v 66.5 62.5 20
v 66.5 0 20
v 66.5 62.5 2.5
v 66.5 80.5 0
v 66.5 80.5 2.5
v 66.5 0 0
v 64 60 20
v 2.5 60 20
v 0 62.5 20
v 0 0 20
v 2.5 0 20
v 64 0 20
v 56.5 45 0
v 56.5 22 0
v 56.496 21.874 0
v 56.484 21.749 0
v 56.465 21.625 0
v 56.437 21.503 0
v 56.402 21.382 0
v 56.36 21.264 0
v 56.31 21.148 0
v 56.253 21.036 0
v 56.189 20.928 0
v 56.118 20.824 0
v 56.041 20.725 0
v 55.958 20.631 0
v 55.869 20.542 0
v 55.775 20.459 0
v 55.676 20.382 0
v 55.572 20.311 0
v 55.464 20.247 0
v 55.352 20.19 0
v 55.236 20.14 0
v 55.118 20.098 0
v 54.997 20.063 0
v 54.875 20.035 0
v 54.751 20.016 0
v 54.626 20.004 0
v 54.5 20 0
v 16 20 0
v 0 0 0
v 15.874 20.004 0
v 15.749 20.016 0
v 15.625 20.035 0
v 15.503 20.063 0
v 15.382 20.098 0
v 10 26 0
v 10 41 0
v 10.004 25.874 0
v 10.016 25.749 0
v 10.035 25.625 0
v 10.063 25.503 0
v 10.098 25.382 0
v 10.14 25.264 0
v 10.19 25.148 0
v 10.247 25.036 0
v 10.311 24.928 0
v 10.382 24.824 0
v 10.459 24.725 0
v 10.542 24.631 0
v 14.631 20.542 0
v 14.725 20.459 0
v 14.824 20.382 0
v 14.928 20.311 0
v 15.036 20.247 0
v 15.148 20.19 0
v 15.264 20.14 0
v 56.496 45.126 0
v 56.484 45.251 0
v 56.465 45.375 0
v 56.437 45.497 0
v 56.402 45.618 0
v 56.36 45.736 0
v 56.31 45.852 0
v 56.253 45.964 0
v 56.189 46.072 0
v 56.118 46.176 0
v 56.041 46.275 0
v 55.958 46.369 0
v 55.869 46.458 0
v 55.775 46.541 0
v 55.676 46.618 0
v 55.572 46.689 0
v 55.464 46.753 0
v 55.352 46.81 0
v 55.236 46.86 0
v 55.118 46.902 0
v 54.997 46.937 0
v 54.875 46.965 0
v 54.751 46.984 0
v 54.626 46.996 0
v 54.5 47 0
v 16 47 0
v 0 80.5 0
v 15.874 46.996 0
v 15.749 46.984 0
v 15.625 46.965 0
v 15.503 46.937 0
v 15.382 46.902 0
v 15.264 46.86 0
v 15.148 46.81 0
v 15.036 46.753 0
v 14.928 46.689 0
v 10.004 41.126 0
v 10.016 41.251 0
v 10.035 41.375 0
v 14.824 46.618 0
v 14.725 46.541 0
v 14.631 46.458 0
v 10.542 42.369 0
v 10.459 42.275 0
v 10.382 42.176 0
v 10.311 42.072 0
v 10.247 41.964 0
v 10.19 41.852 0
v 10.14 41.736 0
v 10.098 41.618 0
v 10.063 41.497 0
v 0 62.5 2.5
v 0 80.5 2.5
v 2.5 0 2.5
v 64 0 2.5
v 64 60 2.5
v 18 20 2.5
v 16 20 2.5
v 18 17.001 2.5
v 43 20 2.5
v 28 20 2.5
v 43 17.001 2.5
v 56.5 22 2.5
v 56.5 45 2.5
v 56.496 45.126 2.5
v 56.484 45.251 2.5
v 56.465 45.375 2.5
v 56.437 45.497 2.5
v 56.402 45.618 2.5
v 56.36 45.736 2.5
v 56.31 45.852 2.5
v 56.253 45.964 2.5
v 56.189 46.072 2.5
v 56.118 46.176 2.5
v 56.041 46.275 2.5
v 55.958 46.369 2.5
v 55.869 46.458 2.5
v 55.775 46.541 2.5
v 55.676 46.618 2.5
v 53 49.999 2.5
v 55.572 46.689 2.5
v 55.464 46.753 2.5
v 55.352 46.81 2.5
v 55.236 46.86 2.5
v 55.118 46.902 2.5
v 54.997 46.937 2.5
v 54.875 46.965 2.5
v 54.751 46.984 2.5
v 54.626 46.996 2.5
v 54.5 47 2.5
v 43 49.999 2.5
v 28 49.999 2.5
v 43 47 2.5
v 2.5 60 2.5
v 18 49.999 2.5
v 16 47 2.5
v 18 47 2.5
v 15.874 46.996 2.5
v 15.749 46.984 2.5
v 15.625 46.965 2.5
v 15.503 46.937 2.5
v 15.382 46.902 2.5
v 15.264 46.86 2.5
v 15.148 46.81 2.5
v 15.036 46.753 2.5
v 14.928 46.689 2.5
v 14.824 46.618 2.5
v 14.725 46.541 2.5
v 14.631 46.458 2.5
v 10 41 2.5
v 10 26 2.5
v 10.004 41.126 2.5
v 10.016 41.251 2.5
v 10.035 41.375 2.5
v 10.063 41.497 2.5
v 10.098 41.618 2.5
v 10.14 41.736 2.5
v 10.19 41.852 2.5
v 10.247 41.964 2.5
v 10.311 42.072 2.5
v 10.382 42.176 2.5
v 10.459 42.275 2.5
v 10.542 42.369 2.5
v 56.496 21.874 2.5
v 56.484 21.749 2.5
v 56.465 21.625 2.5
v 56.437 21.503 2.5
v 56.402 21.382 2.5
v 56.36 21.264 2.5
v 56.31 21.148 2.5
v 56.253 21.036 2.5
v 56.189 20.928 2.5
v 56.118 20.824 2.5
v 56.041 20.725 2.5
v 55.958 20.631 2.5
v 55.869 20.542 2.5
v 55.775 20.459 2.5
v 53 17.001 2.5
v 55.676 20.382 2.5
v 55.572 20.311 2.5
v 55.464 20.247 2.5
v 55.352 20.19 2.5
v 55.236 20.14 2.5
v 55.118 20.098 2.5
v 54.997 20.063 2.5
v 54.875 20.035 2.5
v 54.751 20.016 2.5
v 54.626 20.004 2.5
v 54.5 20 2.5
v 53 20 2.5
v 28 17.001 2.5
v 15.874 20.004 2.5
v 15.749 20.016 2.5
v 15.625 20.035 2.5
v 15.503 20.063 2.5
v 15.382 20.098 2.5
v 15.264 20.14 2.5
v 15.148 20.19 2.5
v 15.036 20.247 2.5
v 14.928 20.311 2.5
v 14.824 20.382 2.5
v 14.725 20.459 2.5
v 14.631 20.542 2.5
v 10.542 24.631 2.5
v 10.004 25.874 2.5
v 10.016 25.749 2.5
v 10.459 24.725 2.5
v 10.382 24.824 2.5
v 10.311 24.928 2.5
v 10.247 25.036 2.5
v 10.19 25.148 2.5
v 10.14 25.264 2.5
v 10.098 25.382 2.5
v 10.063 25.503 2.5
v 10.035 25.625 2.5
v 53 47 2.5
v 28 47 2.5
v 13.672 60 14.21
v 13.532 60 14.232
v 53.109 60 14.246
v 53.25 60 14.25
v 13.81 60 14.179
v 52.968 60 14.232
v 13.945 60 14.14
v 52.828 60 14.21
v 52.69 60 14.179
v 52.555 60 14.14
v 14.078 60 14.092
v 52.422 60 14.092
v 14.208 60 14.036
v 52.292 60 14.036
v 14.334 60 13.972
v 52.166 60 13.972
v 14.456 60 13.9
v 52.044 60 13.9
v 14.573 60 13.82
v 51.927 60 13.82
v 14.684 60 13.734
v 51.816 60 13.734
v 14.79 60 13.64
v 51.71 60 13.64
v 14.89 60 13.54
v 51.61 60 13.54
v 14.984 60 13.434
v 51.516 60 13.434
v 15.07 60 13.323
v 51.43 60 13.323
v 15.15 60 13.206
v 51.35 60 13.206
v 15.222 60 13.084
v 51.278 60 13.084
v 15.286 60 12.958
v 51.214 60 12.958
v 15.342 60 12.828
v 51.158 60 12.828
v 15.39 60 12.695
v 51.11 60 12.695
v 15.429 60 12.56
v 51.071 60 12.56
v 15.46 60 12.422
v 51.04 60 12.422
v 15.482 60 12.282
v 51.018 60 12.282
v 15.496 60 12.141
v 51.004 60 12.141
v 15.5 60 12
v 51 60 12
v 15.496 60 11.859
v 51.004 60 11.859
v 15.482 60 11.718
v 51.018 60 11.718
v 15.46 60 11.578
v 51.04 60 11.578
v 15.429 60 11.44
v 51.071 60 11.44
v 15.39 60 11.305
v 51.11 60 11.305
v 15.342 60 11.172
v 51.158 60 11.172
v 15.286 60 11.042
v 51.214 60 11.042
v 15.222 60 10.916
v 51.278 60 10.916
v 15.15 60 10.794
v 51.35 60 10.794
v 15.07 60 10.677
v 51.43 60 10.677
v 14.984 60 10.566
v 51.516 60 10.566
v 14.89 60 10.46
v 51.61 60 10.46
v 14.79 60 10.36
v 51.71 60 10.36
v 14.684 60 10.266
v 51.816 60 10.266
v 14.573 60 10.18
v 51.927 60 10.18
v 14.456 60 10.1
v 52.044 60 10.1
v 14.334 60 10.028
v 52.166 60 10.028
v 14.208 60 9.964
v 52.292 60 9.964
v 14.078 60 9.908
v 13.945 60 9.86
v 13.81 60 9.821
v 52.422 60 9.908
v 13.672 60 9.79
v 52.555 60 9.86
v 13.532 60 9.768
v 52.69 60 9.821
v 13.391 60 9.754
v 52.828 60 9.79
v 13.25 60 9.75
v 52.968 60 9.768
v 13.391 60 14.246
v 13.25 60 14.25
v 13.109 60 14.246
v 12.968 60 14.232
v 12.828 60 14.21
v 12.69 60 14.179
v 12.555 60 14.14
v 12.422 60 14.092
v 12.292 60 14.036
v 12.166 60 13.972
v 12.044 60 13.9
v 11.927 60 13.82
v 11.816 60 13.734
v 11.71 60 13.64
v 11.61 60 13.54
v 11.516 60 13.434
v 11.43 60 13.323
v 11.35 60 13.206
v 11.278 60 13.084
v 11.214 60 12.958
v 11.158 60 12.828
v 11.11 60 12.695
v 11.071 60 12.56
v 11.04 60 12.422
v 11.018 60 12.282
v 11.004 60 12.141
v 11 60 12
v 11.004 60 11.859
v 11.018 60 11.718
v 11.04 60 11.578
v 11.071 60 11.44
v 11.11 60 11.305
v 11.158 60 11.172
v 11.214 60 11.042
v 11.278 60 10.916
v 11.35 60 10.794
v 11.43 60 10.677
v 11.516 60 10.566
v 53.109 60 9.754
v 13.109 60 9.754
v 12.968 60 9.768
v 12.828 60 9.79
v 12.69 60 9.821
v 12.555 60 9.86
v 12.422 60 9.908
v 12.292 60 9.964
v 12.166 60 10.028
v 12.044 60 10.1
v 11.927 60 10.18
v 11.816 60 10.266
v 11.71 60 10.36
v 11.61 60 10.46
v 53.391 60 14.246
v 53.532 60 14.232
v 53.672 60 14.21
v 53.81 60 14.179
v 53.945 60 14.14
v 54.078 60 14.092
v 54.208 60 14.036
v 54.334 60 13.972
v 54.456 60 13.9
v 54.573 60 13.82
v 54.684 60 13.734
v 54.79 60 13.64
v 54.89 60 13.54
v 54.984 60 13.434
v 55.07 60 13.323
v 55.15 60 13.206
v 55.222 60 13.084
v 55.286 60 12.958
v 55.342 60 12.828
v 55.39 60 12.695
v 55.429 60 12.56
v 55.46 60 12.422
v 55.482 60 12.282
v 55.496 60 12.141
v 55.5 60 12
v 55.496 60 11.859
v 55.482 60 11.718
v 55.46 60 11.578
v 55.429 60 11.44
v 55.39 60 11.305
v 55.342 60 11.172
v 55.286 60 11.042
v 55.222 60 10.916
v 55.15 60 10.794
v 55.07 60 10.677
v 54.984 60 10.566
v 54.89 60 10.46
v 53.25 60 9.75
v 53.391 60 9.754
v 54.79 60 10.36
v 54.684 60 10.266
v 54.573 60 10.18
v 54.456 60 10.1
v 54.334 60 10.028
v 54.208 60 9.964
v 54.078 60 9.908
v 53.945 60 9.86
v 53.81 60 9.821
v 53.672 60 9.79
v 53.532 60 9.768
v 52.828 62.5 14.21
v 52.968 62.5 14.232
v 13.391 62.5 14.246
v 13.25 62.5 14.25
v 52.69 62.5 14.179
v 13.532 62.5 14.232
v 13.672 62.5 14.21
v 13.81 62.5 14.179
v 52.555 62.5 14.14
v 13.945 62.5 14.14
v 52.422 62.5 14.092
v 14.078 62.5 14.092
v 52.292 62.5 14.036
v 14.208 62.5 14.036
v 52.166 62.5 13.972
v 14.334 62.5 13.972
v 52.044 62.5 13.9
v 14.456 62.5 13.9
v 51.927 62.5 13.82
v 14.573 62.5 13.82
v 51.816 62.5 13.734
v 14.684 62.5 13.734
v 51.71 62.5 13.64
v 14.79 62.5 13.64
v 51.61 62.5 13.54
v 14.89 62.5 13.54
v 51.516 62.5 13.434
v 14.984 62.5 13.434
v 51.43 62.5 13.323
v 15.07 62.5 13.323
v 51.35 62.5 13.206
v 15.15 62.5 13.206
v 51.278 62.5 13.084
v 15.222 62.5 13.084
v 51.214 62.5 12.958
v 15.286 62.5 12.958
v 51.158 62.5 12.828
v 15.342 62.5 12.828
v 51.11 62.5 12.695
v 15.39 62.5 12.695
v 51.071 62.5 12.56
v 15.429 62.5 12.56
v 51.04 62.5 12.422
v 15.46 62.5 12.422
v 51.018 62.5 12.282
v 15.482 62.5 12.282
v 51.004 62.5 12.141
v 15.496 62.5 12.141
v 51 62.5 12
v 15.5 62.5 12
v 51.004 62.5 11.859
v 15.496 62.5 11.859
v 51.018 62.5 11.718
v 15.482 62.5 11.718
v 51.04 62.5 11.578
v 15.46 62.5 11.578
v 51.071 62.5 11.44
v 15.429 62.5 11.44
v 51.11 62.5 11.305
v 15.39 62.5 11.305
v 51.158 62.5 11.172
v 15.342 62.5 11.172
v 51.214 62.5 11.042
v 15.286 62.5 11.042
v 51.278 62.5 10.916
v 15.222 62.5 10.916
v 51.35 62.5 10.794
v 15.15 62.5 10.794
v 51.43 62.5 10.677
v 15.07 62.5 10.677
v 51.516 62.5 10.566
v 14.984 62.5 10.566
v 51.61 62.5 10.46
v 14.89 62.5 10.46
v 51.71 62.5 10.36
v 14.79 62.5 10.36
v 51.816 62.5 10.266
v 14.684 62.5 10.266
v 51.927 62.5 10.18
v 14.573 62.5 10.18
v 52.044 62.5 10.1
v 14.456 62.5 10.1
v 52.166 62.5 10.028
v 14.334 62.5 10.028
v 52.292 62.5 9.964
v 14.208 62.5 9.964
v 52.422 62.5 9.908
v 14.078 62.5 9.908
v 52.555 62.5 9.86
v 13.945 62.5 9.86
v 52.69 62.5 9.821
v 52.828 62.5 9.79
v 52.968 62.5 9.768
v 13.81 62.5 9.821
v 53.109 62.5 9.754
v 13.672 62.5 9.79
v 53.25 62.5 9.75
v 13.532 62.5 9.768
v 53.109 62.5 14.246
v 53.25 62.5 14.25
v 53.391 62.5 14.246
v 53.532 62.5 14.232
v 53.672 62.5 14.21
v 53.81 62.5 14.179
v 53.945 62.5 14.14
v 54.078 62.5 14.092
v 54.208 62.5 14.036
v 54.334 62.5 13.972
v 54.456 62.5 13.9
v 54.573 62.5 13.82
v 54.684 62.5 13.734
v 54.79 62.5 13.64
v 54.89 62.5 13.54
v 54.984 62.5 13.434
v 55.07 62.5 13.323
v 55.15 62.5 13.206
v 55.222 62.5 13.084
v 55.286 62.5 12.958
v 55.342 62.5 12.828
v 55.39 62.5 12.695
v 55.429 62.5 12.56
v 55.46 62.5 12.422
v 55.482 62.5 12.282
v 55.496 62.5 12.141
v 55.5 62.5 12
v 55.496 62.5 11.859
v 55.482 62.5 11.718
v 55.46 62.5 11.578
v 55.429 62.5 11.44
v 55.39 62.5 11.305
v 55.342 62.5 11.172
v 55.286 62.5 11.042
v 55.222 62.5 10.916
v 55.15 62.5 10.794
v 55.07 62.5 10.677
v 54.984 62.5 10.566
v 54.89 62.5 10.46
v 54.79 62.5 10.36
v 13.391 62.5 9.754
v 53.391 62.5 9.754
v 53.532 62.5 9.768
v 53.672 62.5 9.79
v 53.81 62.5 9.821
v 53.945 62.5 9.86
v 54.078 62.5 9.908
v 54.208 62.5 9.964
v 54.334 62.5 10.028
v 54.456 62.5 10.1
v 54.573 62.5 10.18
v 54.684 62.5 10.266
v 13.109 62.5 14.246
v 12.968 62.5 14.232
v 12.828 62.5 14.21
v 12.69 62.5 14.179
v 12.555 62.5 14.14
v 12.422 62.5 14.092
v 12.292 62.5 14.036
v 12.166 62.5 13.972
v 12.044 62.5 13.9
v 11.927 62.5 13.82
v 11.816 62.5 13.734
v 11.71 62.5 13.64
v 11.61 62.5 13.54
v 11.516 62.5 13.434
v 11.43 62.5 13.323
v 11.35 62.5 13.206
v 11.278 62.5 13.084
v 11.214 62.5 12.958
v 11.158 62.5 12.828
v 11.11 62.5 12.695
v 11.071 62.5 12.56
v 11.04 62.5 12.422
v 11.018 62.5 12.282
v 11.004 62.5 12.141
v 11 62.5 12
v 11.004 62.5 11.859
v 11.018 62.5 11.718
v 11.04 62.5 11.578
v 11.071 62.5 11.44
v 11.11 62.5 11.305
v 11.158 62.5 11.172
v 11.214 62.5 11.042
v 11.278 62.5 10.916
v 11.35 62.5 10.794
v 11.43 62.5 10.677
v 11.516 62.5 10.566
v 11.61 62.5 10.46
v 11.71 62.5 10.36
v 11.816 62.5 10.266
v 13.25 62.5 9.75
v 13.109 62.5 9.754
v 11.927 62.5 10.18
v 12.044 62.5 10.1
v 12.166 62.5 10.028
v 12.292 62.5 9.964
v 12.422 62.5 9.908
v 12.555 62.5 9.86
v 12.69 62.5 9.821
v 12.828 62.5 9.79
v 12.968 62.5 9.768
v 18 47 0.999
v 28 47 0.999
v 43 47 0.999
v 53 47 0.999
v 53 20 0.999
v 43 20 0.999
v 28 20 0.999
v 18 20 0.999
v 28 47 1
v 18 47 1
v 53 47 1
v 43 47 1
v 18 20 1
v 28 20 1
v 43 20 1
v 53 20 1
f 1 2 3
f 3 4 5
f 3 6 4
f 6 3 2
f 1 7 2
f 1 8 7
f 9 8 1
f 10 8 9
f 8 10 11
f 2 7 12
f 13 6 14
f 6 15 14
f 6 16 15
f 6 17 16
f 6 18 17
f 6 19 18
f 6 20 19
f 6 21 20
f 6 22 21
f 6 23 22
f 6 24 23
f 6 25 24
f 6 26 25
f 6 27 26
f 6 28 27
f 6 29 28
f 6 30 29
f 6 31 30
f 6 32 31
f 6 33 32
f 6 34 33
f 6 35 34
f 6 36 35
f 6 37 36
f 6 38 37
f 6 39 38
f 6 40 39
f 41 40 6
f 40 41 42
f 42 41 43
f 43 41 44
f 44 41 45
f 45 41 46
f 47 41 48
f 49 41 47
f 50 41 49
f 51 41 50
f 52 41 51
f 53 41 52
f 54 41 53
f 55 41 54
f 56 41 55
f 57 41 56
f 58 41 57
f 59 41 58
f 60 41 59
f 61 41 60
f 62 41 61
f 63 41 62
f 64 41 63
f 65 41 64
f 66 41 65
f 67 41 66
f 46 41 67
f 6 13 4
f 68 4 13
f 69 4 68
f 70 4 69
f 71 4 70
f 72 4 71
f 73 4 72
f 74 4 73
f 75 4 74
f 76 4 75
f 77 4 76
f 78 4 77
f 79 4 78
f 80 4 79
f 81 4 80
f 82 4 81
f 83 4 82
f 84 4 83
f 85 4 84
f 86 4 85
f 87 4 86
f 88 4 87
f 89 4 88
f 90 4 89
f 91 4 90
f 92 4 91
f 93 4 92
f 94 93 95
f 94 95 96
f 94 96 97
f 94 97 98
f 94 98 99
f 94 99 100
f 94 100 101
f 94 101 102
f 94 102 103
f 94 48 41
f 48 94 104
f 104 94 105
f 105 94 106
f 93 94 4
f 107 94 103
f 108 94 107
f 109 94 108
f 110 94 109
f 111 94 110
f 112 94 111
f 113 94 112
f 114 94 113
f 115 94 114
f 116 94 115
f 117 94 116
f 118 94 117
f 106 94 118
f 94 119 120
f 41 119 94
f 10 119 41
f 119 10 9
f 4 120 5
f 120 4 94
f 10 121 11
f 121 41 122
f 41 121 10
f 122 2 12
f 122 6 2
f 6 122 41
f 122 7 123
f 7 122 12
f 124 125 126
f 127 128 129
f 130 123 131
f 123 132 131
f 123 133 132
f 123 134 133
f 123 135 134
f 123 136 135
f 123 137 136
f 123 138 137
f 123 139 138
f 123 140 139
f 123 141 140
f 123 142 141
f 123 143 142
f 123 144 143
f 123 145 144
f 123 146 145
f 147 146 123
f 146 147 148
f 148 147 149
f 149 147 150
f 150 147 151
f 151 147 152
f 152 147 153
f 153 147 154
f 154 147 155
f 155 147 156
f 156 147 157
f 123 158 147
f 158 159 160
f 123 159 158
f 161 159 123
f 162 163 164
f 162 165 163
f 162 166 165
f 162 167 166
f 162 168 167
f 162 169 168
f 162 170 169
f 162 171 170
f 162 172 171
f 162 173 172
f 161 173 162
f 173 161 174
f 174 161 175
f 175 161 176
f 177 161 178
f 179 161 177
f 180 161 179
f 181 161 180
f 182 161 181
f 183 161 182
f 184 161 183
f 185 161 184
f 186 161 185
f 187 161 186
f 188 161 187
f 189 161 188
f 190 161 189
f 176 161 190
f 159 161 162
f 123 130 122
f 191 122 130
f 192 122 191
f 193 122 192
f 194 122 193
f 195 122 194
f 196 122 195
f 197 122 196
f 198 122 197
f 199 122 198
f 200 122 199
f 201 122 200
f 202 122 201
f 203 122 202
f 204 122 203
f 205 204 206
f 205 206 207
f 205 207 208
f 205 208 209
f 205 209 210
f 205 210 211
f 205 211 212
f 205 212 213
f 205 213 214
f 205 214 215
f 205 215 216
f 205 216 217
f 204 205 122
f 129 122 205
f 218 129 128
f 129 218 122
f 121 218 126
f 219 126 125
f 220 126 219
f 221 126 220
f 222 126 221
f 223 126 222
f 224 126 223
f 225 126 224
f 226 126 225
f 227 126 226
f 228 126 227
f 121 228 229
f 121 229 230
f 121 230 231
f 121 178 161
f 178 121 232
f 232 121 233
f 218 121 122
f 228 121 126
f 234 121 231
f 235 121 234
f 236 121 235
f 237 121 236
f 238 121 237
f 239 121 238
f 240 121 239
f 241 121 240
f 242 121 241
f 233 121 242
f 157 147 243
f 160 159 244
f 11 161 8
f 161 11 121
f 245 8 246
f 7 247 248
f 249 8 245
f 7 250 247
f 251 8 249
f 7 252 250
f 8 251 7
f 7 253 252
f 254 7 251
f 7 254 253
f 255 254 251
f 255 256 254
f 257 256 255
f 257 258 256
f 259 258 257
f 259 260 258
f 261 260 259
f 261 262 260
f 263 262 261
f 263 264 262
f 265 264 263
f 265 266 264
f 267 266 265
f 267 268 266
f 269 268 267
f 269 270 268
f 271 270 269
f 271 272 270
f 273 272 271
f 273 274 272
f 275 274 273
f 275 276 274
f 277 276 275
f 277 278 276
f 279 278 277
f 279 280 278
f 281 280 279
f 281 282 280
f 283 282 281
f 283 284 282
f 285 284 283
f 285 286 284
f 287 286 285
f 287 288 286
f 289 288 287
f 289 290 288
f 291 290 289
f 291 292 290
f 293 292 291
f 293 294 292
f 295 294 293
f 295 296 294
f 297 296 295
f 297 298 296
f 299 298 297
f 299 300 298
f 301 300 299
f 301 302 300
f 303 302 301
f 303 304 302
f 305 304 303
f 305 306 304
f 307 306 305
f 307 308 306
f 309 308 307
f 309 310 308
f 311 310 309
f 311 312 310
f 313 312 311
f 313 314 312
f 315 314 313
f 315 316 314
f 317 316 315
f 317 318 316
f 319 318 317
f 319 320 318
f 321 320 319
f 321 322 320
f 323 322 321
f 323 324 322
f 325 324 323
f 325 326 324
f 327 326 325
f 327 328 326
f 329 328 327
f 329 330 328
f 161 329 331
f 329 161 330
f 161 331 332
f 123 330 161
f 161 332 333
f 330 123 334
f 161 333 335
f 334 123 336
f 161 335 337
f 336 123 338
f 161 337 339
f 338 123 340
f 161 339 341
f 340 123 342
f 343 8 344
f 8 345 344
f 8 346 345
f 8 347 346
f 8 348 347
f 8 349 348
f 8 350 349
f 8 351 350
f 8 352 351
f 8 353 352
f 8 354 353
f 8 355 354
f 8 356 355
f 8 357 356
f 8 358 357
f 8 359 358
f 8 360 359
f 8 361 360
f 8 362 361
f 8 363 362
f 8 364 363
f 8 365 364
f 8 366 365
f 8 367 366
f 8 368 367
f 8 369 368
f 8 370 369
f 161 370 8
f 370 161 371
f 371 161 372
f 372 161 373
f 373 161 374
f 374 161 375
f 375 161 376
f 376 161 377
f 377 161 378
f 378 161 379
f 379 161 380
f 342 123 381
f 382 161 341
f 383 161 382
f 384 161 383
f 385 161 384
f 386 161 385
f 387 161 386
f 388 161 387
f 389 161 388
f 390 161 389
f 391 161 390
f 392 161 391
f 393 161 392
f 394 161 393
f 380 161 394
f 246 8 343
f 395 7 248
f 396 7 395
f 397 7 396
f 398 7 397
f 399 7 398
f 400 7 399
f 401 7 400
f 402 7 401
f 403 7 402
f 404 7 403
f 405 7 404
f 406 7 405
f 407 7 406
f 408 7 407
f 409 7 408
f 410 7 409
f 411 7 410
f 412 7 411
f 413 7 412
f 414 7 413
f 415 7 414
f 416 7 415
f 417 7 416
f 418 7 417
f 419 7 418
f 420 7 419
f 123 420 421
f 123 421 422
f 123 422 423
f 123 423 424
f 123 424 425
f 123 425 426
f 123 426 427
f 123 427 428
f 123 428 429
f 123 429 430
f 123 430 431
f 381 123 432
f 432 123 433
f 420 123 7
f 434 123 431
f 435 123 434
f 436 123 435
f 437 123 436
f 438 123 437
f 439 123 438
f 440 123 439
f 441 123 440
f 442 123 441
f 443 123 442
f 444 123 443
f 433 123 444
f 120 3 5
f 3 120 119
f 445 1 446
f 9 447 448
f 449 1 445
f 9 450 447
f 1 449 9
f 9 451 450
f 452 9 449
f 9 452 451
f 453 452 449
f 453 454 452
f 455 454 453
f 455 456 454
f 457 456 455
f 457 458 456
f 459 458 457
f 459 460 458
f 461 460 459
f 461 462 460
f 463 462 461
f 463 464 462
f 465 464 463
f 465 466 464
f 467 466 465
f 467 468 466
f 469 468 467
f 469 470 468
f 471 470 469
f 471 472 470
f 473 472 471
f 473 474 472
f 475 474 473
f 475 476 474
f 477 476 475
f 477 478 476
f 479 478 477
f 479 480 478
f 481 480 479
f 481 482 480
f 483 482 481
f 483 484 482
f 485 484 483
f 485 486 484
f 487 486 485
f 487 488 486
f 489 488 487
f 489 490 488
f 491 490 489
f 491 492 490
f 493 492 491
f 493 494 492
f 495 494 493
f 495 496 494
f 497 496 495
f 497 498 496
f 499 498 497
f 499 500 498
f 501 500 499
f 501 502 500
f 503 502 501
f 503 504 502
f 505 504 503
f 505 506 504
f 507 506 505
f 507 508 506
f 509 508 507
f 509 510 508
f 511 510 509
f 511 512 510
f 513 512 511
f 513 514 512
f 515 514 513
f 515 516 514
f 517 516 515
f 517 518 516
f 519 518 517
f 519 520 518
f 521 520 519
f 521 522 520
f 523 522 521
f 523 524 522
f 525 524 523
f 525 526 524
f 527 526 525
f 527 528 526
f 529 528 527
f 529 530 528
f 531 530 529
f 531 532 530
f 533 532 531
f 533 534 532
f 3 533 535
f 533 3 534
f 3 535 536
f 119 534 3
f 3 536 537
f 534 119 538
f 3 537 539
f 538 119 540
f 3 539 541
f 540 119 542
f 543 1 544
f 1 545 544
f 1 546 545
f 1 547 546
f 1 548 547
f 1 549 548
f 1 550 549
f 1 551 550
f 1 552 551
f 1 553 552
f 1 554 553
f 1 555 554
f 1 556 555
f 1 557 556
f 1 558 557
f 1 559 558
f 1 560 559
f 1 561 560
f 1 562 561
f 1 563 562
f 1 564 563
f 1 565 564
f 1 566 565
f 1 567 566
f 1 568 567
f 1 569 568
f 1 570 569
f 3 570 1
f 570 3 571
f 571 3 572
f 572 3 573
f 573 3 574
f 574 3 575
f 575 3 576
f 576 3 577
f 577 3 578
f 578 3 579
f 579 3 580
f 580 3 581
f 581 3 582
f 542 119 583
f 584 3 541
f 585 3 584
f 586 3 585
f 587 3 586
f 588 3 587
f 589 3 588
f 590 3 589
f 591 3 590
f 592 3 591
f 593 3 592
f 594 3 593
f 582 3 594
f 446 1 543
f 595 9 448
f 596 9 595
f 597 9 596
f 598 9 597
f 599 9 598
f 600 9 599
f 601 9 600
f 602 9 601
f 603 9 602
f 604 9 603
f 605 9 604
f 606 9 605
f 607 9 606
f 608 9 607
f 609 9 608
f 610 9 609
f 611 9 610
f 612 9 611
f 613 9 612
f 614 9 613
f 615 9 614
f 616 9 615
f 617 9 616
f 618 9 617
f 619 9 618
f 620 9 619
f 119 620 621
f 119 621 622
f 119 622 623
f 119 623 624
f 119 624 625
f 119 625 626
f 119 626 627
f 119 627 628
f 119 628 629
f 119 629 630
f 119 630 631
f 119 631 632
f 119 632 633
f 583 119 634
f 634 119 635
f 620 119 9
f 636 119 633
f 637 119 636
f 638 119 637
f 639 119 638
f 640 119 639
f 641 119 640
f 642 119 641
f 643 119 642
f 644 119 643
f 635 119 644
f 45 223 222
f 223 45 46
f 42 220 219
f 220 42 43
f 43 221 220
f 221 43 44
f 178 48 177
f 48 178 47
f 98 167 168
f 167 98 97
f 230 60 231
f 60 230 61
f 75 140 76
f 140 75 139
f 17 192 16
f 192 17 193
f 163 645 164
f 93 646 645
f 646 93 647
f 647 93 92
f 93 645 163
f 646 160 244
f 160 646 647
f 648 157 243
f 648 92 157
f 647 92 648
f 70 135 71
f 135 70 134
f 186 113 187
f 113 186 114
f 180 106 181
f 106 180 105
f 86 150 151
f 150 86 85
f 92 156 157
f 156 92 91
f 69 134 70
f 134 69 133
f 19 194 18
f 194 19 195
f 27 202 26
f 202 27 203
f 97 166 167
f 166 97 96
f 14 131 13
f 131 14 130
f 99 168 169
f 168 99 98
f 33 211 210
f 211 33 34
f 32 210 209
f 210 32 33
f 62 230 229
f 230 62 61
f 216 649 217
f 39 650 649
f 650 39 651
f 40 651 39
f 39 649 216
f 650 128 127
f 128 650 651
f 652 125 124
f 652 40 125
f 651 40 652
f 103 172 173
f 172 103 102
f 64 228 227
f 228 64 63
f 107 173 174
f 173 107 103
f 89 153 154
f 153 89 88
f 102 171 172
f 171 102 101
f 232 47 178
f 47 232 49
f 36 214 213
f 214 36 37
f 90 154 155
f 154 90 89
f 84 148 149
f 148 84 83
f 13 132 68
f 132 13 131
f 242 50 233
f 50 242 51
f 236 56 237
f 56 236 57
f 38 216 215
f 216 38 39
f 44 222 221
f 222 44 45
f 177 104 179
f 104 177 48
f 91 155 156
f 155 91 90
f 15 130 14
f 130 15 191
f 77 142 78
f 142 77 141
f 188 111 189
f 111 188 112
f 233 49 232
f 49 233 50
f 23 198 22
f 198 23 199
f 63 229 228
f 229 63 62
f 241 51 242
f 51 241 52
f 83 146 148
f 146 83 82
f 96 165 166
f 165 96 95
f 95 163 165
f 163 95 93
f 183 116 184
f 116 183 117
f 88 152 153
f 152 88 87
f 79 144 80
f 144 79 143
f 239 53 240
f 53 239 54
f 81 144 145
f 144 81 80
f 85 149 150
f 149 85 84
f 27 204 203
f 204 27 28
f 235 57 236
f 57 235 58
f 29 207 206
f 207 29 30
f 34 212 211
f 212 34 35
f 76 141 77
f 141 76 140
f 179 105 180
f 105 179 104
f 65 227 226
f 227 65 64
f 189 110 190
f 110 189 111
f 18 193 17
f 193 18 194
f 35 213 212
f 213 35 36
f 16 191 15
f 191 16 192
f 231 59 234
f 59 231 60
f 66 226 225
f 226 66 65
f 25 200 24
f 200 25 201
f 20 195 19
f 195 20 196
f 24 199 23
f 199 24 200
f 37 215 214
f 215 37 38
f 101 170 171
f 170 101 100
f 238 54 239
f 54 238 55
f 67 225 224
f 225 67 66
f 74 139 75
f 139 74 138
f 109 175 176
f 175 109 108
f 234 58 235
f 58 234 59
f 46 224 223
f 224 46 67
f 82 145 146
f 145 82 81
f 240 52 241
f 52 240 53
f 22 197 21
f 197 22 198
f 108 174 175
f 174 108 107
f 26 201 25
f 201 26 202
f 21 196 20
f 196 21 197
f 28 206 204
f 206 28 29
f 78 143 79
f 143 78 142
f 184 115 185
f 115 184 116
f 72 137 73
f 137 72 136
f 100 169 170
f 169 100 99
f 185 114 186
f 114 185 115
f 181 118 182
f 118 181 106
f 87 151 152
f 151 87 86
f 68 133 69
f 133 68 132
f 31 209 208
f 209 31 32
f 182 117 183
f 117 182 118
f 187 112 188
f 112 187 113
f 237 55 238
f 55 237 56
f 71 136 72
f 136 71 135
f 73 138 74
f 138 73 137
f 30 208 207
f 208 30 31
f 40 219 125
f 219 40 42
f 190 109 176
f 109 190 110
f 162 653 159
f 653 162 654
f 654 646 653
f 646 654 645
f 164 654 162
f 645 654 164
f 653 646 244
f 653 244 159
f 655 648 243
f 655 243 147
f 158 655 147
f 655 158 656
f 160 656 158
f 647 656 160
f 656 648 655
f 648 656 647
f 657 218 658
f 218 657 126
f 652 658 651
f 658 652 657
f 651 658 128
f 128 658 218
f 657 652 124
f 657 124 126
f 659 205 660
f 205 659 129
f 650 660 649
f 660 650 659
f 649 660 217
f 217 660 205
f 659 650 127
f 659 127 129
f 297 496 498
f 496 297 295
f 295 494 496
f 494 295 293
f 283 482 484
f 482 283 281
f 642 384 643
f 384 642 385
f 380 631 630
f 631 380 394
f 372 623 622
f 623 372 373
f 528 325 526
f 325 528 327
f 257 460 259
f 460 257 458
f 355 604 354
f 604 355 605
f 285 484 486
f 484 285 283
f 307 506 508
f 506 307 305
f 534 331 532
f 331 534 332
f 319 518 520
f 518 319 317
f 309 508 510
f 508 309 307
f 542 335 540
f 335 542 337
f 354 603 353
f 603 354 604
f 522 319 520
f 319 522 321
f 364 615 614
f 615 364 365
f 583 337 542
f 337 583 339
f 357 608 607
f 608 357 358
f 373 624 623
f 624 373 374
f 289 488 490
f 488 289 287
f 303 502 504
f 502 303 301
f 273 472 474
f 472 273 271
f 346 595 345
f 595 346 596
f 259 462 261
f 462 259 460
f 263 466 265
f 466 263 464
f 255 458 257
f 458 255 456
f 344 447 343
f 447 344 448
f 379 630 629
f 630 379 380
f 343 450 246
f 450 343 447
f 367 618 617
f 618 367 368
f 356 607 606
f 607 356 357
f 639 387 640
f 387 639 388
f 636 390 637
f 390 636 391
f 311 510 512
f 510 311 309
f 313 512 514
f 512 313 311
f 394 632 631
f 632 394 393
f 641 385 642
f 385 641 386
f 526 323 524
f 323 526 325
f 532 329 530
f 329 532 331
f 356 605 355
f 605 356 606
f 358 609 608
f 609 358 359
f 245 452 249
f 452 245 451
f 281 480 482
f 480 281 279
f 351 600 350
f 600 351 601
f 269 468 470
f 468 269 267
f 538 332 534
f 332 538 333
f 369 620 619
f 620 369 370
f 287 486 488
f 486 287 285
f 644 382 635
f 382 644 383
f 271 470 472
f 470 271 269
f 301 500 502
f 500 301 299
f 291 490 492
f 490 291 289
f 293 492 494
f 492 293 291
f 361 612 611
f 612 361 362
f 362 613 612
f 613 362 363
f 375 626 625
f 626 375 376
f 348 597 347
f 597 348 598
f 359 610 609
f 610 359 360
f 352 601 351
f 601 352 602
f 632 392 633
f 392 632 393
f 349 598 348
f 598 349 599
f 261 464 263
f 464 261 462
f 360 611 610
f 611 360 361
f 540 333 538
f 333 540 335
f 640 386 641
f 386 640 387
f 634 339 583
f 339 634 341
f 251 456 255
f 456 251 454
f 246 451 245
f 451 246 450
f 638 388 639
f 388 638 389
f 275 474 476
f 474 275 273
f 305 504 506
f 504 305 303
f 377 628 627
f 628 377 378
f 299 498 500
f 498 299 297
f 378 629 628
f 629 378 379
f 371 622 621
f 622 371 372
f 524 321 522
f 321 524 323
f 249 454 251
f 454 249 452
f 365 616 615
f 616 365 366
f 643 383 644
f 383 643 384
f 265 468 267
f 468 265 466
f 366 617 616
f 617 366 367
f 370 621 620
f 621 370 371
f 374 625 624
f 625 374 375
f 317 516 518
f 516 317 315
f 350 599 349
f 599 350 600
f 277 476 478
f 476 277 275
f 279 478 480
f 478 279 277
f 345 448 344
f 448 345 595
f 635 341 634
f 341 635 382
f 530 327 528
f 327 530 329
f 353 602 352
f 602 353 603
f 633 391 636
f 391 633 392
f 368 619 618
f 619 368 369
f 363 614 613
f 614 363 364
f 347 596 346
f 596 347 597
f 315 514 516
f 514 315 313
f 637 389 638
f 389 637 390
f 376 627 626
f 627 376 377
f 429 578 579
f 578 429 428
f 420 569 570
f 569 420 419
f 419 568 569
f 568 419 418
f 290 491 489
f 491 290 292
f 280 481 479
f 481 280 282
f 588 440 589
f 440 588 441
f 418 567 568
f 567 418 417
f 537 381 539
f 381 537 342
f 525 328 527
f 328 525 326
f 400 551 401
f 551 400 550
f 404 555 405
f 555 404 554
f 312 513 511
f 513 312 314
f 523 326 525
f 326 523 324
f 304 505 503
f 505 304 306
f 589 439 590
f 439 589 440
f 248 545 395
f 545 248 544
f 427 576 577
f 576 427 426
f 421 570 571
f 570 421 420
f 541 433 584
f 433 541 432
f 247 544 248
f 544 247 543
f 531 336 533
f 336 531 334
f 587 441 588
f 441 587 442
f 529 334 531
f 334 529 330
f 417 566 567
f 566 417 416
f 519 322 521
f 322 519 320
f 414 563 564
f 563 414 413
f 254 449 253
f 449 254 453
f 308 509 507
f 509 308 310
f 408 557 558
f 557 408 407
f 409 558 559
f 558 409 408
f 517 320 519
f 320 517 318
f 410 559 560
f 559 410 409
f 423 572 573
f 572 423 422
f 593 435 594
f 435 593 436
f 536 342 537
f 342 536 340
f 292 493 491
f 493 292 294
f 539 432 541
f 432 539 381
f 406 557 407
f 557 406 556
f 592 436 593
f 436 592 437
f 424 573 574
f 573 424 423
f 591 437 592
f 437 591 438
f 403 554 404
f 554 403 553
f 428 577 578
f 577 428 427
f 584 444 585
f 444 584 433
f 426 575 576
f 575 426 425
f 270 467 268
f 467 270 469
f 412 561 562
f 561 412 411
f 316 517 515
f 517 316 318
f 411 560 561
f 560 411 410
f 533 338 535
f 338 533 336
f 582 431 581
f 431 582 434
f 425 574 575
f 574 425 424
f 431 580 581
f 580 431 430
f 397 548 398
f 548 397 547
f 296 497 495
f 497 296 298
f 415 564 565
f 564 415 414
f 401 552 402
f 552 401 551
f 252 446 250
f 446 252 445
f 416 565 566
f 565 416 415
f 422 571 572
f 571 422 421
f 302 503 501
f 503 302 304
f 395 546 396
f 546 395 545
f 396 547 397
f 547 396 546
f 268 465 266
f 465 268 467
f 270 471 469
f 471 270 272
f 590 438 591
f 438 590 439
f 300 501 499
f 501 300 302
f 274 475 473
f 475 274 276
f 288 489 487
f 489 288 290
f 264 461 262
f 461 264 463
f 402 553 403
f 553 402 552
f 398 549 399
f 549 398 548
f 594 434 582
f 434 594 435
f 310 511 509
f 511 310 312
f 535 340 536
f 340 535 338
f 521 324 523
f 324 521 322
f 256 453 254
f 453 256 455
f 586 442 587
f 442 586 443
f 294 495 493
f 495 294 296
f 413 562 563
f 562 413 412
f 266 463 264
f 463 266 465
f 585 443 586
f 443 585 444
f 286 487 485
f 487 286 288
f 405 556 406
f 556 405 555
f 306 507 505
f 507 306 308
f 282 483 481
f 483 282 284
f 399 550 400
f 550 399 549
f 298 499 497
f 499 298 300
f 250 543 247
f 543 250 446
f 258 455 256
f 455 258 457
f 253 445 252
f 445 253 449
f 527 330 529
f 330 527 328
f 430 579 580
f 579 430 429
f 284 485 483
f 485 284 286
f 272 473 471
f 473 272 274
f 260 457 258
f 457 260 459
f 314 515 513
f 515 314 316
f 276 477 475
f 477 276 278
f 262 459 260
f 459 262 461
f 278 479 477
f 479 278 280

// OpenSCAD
$fn= 100;

difference()
{
    cube([66.5,80.5,20]);
    translate([2.5,-0.001,2.5])
        cube([61.5,60.001,17.501]);
    translate([-0.001,62.5,2.5])
        cube([66.502,18.001,17.501]);
    translate([10,20,-0.001])
        hull()
        {
            translate([2,6,0])
                cylinder(d=4,h=2.502);
            translate([6,2,0])
                cylinder(d=4,h=2.502);
            translate([44.5,2,0])
                cylinder(d=4,h=2.502);
            translate([44.5,25,0])
                cylinder(d=4,h=2.502);
            translate([6,25,0])
                cylinder(d=4,h=2.502);
            translate([2,21,0])
                cylinder(d=4,h=2.502);
        }
    translate([18,47,0])
        mount_clip();
    translate([43,47,0])
        mount_clip();
    translate([18,20,0])
        mirror([0,1,0])
            mount_clip();
    translate([43,20,0])
        mirror([0,1,0])
            mount_clip();
    translate([13.25,59.999,12])
        rotate([-90,0,0])
            cylinder(d=4.5,h=2.502);
    translate([53.25,59.999,12])
        rotate([-90,0,0])
            cylinder(d=4.5,h=2.502);
}


module mount_clip()
{
    hull()
    {
        translate([0,0,1])
            rotate([0,90,0])
                cylinder(d=0.001,h=10);
        translate([0,0,2.501])
            rotate([0,90,0])
                cylinder(d=0.001,h=10);
        translate([0,3,2.501])
            rotate([0,90,0])
                cylinder(d=0.001,h=10);
    }
}
